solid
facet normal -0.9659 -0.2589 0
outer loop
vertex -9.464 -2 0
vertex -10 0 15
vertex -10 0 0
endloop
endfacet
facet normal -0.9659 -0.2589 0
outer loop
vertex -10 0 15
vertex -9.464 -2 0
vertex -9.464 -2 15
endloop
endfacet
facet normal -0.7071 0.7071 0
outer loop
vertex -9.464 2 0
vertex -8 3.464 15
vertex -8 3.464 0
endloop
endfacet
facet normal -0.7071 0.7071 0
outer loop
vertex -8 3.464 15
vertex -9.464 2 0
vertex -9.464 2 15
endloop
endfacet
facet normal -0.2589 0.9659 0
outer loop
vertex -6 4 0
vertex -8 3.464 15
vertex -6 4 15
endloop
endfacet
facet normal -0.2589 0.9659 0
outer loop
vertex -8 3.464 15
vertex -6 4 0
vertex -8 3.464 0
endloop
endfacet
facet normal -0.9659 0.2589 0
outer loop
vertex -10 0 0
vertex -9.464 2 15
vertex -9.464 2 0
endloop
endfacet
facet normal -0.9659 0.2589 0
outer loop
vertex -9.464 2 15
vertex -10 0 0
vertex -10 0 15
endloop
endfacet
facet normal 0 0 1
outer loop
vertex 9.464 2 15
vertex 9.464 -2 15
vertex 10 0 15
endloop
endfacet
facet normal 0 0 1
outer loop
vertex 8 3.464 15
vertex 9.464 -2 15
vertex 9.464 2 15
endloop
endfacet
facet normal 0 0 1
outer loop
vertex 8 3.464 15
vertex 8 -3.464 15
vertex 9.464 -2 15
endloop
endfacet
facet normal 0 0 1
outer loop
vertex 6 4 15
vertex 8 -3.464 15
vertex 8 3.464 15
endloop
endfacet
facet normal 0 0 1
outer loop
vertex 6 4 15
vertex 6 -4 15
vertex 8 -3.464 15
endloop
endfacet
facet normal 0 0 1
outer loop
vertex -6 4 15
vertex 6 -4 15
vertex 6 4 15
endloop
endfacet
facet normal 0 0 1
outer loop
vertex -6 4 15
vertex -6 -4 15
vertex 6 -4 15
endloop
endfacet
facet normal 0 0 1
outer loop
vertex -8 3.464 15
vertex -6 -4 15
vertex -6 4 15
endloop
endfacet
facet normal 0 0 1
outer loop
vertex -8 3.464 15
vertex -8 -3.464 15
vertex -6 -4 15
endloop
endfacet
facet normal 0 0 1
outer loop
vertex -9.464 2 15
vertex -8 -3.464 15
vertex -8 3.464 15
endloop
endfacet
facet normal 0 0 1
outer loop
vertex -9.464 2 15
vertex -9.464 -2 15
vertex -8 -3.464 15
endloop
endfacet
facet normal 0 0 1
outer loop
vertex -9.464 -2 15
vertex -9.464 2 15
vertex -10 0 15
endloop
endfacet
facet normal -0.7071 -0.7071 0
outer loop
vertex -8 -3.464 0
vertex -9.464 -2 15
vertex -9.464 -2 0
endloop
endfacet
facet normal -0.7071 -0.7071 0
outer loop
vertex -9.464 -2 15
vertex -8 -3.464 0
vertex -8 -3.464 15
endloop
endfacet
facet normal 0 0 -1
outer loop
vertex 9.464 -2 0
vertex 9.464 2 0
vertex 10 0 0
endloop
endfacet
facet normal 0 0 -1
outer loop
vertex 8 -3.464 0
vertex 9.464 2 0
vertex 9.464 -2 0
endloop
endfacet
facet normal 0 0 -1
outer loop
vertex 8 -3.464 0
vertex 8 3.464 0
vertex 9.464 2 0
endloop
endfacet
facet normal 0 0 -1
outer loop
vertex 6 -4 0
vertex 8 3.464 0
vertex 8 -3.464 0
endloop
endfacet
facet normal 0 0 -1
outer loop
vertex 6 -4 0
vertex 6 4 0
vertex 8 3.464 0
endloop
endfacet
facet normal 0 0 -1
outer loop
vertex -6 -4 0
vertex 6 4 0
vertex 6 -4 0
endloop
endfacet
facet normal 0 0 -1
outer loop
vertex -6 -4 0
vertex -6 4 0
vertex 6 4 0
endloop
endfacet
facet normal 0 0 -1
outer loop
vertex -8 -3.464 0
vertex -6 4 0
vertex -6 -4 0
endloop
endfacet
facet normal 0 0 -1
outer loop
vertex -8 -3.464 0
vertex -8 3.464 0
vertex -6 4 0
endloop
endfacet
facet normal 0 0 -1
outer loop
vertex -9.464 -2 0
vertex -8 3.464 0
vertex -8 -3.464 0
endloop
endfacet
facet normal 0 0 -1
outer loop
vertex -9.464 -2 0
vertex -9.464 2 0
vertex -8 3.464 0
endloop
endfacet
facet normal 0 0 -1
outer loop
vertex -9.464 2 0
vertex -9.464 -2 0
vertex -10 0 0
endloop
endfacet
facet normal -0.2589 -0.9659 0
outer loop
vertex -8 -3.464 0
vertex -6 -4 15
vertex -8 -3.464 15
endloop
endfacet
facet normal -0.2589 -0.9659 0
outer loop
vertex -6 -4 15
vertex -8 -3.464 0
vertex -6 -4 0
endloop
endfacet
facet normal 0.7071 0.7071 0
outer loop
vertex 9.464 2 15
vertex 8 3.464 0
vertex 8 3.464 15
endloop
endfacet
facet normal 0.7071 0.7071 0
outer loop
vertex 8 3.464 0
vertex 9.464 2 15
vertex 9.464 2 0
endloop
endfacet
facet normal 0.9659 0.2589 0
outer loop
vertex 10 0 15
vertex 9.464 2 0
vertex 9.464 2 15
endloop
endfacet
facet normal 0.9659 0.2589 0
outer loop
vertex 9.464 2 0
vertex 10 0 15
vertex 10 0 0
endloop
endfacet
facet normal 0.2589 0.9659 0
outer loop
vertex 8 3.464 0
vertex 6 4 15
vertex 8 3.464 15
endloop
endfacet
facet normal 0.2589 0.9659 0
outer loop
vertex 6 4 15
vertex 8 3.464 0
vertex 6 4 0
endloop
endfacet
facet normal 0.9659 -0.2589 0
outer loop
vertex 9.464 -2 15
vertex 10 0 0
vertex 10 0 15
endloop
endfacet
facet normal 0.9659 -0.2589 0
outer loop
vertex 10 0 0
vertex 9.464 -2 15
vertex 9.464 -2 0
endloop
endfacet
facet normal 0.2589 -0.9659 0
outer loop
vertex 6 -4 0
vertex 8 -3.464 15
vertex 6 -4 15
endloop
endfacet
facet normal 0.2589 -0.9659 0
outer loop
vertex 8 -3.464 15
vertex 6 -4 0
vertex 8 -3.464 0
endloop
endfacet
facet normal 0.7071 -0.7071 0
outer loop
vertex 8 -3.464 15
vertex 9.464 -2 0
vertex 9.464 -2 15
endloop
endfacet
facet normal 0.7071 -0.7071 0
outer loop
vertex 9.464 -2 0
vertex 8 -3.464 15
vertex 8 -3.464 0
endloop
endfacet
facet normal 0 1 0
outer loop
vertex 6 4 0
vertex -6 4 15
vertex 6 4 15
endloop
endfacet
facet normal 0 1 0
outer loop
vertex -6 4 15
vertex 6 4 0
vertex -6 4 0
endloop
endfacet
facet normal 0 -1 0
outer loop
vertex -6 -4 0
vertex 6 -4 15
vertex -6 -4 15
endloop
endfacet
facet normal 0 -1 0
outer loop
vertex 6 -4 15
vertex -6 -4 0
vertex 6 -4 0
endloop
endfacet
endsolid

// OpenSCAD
//slotted_hole module for sloppy screw holes, etc

slotted_hole(r=4,l=20,h=15);


module slotted_hole(r, l, h) {
    d = l/2-r;
    union(){
        for (offset = [-d, d]) {
            translate([offset,0,0])
                cylinder(r=r, h=h, $fn=12);
        }
        translate([-d,-r,0])
            cube([l-2*r,2*r,h]);
    }
}
